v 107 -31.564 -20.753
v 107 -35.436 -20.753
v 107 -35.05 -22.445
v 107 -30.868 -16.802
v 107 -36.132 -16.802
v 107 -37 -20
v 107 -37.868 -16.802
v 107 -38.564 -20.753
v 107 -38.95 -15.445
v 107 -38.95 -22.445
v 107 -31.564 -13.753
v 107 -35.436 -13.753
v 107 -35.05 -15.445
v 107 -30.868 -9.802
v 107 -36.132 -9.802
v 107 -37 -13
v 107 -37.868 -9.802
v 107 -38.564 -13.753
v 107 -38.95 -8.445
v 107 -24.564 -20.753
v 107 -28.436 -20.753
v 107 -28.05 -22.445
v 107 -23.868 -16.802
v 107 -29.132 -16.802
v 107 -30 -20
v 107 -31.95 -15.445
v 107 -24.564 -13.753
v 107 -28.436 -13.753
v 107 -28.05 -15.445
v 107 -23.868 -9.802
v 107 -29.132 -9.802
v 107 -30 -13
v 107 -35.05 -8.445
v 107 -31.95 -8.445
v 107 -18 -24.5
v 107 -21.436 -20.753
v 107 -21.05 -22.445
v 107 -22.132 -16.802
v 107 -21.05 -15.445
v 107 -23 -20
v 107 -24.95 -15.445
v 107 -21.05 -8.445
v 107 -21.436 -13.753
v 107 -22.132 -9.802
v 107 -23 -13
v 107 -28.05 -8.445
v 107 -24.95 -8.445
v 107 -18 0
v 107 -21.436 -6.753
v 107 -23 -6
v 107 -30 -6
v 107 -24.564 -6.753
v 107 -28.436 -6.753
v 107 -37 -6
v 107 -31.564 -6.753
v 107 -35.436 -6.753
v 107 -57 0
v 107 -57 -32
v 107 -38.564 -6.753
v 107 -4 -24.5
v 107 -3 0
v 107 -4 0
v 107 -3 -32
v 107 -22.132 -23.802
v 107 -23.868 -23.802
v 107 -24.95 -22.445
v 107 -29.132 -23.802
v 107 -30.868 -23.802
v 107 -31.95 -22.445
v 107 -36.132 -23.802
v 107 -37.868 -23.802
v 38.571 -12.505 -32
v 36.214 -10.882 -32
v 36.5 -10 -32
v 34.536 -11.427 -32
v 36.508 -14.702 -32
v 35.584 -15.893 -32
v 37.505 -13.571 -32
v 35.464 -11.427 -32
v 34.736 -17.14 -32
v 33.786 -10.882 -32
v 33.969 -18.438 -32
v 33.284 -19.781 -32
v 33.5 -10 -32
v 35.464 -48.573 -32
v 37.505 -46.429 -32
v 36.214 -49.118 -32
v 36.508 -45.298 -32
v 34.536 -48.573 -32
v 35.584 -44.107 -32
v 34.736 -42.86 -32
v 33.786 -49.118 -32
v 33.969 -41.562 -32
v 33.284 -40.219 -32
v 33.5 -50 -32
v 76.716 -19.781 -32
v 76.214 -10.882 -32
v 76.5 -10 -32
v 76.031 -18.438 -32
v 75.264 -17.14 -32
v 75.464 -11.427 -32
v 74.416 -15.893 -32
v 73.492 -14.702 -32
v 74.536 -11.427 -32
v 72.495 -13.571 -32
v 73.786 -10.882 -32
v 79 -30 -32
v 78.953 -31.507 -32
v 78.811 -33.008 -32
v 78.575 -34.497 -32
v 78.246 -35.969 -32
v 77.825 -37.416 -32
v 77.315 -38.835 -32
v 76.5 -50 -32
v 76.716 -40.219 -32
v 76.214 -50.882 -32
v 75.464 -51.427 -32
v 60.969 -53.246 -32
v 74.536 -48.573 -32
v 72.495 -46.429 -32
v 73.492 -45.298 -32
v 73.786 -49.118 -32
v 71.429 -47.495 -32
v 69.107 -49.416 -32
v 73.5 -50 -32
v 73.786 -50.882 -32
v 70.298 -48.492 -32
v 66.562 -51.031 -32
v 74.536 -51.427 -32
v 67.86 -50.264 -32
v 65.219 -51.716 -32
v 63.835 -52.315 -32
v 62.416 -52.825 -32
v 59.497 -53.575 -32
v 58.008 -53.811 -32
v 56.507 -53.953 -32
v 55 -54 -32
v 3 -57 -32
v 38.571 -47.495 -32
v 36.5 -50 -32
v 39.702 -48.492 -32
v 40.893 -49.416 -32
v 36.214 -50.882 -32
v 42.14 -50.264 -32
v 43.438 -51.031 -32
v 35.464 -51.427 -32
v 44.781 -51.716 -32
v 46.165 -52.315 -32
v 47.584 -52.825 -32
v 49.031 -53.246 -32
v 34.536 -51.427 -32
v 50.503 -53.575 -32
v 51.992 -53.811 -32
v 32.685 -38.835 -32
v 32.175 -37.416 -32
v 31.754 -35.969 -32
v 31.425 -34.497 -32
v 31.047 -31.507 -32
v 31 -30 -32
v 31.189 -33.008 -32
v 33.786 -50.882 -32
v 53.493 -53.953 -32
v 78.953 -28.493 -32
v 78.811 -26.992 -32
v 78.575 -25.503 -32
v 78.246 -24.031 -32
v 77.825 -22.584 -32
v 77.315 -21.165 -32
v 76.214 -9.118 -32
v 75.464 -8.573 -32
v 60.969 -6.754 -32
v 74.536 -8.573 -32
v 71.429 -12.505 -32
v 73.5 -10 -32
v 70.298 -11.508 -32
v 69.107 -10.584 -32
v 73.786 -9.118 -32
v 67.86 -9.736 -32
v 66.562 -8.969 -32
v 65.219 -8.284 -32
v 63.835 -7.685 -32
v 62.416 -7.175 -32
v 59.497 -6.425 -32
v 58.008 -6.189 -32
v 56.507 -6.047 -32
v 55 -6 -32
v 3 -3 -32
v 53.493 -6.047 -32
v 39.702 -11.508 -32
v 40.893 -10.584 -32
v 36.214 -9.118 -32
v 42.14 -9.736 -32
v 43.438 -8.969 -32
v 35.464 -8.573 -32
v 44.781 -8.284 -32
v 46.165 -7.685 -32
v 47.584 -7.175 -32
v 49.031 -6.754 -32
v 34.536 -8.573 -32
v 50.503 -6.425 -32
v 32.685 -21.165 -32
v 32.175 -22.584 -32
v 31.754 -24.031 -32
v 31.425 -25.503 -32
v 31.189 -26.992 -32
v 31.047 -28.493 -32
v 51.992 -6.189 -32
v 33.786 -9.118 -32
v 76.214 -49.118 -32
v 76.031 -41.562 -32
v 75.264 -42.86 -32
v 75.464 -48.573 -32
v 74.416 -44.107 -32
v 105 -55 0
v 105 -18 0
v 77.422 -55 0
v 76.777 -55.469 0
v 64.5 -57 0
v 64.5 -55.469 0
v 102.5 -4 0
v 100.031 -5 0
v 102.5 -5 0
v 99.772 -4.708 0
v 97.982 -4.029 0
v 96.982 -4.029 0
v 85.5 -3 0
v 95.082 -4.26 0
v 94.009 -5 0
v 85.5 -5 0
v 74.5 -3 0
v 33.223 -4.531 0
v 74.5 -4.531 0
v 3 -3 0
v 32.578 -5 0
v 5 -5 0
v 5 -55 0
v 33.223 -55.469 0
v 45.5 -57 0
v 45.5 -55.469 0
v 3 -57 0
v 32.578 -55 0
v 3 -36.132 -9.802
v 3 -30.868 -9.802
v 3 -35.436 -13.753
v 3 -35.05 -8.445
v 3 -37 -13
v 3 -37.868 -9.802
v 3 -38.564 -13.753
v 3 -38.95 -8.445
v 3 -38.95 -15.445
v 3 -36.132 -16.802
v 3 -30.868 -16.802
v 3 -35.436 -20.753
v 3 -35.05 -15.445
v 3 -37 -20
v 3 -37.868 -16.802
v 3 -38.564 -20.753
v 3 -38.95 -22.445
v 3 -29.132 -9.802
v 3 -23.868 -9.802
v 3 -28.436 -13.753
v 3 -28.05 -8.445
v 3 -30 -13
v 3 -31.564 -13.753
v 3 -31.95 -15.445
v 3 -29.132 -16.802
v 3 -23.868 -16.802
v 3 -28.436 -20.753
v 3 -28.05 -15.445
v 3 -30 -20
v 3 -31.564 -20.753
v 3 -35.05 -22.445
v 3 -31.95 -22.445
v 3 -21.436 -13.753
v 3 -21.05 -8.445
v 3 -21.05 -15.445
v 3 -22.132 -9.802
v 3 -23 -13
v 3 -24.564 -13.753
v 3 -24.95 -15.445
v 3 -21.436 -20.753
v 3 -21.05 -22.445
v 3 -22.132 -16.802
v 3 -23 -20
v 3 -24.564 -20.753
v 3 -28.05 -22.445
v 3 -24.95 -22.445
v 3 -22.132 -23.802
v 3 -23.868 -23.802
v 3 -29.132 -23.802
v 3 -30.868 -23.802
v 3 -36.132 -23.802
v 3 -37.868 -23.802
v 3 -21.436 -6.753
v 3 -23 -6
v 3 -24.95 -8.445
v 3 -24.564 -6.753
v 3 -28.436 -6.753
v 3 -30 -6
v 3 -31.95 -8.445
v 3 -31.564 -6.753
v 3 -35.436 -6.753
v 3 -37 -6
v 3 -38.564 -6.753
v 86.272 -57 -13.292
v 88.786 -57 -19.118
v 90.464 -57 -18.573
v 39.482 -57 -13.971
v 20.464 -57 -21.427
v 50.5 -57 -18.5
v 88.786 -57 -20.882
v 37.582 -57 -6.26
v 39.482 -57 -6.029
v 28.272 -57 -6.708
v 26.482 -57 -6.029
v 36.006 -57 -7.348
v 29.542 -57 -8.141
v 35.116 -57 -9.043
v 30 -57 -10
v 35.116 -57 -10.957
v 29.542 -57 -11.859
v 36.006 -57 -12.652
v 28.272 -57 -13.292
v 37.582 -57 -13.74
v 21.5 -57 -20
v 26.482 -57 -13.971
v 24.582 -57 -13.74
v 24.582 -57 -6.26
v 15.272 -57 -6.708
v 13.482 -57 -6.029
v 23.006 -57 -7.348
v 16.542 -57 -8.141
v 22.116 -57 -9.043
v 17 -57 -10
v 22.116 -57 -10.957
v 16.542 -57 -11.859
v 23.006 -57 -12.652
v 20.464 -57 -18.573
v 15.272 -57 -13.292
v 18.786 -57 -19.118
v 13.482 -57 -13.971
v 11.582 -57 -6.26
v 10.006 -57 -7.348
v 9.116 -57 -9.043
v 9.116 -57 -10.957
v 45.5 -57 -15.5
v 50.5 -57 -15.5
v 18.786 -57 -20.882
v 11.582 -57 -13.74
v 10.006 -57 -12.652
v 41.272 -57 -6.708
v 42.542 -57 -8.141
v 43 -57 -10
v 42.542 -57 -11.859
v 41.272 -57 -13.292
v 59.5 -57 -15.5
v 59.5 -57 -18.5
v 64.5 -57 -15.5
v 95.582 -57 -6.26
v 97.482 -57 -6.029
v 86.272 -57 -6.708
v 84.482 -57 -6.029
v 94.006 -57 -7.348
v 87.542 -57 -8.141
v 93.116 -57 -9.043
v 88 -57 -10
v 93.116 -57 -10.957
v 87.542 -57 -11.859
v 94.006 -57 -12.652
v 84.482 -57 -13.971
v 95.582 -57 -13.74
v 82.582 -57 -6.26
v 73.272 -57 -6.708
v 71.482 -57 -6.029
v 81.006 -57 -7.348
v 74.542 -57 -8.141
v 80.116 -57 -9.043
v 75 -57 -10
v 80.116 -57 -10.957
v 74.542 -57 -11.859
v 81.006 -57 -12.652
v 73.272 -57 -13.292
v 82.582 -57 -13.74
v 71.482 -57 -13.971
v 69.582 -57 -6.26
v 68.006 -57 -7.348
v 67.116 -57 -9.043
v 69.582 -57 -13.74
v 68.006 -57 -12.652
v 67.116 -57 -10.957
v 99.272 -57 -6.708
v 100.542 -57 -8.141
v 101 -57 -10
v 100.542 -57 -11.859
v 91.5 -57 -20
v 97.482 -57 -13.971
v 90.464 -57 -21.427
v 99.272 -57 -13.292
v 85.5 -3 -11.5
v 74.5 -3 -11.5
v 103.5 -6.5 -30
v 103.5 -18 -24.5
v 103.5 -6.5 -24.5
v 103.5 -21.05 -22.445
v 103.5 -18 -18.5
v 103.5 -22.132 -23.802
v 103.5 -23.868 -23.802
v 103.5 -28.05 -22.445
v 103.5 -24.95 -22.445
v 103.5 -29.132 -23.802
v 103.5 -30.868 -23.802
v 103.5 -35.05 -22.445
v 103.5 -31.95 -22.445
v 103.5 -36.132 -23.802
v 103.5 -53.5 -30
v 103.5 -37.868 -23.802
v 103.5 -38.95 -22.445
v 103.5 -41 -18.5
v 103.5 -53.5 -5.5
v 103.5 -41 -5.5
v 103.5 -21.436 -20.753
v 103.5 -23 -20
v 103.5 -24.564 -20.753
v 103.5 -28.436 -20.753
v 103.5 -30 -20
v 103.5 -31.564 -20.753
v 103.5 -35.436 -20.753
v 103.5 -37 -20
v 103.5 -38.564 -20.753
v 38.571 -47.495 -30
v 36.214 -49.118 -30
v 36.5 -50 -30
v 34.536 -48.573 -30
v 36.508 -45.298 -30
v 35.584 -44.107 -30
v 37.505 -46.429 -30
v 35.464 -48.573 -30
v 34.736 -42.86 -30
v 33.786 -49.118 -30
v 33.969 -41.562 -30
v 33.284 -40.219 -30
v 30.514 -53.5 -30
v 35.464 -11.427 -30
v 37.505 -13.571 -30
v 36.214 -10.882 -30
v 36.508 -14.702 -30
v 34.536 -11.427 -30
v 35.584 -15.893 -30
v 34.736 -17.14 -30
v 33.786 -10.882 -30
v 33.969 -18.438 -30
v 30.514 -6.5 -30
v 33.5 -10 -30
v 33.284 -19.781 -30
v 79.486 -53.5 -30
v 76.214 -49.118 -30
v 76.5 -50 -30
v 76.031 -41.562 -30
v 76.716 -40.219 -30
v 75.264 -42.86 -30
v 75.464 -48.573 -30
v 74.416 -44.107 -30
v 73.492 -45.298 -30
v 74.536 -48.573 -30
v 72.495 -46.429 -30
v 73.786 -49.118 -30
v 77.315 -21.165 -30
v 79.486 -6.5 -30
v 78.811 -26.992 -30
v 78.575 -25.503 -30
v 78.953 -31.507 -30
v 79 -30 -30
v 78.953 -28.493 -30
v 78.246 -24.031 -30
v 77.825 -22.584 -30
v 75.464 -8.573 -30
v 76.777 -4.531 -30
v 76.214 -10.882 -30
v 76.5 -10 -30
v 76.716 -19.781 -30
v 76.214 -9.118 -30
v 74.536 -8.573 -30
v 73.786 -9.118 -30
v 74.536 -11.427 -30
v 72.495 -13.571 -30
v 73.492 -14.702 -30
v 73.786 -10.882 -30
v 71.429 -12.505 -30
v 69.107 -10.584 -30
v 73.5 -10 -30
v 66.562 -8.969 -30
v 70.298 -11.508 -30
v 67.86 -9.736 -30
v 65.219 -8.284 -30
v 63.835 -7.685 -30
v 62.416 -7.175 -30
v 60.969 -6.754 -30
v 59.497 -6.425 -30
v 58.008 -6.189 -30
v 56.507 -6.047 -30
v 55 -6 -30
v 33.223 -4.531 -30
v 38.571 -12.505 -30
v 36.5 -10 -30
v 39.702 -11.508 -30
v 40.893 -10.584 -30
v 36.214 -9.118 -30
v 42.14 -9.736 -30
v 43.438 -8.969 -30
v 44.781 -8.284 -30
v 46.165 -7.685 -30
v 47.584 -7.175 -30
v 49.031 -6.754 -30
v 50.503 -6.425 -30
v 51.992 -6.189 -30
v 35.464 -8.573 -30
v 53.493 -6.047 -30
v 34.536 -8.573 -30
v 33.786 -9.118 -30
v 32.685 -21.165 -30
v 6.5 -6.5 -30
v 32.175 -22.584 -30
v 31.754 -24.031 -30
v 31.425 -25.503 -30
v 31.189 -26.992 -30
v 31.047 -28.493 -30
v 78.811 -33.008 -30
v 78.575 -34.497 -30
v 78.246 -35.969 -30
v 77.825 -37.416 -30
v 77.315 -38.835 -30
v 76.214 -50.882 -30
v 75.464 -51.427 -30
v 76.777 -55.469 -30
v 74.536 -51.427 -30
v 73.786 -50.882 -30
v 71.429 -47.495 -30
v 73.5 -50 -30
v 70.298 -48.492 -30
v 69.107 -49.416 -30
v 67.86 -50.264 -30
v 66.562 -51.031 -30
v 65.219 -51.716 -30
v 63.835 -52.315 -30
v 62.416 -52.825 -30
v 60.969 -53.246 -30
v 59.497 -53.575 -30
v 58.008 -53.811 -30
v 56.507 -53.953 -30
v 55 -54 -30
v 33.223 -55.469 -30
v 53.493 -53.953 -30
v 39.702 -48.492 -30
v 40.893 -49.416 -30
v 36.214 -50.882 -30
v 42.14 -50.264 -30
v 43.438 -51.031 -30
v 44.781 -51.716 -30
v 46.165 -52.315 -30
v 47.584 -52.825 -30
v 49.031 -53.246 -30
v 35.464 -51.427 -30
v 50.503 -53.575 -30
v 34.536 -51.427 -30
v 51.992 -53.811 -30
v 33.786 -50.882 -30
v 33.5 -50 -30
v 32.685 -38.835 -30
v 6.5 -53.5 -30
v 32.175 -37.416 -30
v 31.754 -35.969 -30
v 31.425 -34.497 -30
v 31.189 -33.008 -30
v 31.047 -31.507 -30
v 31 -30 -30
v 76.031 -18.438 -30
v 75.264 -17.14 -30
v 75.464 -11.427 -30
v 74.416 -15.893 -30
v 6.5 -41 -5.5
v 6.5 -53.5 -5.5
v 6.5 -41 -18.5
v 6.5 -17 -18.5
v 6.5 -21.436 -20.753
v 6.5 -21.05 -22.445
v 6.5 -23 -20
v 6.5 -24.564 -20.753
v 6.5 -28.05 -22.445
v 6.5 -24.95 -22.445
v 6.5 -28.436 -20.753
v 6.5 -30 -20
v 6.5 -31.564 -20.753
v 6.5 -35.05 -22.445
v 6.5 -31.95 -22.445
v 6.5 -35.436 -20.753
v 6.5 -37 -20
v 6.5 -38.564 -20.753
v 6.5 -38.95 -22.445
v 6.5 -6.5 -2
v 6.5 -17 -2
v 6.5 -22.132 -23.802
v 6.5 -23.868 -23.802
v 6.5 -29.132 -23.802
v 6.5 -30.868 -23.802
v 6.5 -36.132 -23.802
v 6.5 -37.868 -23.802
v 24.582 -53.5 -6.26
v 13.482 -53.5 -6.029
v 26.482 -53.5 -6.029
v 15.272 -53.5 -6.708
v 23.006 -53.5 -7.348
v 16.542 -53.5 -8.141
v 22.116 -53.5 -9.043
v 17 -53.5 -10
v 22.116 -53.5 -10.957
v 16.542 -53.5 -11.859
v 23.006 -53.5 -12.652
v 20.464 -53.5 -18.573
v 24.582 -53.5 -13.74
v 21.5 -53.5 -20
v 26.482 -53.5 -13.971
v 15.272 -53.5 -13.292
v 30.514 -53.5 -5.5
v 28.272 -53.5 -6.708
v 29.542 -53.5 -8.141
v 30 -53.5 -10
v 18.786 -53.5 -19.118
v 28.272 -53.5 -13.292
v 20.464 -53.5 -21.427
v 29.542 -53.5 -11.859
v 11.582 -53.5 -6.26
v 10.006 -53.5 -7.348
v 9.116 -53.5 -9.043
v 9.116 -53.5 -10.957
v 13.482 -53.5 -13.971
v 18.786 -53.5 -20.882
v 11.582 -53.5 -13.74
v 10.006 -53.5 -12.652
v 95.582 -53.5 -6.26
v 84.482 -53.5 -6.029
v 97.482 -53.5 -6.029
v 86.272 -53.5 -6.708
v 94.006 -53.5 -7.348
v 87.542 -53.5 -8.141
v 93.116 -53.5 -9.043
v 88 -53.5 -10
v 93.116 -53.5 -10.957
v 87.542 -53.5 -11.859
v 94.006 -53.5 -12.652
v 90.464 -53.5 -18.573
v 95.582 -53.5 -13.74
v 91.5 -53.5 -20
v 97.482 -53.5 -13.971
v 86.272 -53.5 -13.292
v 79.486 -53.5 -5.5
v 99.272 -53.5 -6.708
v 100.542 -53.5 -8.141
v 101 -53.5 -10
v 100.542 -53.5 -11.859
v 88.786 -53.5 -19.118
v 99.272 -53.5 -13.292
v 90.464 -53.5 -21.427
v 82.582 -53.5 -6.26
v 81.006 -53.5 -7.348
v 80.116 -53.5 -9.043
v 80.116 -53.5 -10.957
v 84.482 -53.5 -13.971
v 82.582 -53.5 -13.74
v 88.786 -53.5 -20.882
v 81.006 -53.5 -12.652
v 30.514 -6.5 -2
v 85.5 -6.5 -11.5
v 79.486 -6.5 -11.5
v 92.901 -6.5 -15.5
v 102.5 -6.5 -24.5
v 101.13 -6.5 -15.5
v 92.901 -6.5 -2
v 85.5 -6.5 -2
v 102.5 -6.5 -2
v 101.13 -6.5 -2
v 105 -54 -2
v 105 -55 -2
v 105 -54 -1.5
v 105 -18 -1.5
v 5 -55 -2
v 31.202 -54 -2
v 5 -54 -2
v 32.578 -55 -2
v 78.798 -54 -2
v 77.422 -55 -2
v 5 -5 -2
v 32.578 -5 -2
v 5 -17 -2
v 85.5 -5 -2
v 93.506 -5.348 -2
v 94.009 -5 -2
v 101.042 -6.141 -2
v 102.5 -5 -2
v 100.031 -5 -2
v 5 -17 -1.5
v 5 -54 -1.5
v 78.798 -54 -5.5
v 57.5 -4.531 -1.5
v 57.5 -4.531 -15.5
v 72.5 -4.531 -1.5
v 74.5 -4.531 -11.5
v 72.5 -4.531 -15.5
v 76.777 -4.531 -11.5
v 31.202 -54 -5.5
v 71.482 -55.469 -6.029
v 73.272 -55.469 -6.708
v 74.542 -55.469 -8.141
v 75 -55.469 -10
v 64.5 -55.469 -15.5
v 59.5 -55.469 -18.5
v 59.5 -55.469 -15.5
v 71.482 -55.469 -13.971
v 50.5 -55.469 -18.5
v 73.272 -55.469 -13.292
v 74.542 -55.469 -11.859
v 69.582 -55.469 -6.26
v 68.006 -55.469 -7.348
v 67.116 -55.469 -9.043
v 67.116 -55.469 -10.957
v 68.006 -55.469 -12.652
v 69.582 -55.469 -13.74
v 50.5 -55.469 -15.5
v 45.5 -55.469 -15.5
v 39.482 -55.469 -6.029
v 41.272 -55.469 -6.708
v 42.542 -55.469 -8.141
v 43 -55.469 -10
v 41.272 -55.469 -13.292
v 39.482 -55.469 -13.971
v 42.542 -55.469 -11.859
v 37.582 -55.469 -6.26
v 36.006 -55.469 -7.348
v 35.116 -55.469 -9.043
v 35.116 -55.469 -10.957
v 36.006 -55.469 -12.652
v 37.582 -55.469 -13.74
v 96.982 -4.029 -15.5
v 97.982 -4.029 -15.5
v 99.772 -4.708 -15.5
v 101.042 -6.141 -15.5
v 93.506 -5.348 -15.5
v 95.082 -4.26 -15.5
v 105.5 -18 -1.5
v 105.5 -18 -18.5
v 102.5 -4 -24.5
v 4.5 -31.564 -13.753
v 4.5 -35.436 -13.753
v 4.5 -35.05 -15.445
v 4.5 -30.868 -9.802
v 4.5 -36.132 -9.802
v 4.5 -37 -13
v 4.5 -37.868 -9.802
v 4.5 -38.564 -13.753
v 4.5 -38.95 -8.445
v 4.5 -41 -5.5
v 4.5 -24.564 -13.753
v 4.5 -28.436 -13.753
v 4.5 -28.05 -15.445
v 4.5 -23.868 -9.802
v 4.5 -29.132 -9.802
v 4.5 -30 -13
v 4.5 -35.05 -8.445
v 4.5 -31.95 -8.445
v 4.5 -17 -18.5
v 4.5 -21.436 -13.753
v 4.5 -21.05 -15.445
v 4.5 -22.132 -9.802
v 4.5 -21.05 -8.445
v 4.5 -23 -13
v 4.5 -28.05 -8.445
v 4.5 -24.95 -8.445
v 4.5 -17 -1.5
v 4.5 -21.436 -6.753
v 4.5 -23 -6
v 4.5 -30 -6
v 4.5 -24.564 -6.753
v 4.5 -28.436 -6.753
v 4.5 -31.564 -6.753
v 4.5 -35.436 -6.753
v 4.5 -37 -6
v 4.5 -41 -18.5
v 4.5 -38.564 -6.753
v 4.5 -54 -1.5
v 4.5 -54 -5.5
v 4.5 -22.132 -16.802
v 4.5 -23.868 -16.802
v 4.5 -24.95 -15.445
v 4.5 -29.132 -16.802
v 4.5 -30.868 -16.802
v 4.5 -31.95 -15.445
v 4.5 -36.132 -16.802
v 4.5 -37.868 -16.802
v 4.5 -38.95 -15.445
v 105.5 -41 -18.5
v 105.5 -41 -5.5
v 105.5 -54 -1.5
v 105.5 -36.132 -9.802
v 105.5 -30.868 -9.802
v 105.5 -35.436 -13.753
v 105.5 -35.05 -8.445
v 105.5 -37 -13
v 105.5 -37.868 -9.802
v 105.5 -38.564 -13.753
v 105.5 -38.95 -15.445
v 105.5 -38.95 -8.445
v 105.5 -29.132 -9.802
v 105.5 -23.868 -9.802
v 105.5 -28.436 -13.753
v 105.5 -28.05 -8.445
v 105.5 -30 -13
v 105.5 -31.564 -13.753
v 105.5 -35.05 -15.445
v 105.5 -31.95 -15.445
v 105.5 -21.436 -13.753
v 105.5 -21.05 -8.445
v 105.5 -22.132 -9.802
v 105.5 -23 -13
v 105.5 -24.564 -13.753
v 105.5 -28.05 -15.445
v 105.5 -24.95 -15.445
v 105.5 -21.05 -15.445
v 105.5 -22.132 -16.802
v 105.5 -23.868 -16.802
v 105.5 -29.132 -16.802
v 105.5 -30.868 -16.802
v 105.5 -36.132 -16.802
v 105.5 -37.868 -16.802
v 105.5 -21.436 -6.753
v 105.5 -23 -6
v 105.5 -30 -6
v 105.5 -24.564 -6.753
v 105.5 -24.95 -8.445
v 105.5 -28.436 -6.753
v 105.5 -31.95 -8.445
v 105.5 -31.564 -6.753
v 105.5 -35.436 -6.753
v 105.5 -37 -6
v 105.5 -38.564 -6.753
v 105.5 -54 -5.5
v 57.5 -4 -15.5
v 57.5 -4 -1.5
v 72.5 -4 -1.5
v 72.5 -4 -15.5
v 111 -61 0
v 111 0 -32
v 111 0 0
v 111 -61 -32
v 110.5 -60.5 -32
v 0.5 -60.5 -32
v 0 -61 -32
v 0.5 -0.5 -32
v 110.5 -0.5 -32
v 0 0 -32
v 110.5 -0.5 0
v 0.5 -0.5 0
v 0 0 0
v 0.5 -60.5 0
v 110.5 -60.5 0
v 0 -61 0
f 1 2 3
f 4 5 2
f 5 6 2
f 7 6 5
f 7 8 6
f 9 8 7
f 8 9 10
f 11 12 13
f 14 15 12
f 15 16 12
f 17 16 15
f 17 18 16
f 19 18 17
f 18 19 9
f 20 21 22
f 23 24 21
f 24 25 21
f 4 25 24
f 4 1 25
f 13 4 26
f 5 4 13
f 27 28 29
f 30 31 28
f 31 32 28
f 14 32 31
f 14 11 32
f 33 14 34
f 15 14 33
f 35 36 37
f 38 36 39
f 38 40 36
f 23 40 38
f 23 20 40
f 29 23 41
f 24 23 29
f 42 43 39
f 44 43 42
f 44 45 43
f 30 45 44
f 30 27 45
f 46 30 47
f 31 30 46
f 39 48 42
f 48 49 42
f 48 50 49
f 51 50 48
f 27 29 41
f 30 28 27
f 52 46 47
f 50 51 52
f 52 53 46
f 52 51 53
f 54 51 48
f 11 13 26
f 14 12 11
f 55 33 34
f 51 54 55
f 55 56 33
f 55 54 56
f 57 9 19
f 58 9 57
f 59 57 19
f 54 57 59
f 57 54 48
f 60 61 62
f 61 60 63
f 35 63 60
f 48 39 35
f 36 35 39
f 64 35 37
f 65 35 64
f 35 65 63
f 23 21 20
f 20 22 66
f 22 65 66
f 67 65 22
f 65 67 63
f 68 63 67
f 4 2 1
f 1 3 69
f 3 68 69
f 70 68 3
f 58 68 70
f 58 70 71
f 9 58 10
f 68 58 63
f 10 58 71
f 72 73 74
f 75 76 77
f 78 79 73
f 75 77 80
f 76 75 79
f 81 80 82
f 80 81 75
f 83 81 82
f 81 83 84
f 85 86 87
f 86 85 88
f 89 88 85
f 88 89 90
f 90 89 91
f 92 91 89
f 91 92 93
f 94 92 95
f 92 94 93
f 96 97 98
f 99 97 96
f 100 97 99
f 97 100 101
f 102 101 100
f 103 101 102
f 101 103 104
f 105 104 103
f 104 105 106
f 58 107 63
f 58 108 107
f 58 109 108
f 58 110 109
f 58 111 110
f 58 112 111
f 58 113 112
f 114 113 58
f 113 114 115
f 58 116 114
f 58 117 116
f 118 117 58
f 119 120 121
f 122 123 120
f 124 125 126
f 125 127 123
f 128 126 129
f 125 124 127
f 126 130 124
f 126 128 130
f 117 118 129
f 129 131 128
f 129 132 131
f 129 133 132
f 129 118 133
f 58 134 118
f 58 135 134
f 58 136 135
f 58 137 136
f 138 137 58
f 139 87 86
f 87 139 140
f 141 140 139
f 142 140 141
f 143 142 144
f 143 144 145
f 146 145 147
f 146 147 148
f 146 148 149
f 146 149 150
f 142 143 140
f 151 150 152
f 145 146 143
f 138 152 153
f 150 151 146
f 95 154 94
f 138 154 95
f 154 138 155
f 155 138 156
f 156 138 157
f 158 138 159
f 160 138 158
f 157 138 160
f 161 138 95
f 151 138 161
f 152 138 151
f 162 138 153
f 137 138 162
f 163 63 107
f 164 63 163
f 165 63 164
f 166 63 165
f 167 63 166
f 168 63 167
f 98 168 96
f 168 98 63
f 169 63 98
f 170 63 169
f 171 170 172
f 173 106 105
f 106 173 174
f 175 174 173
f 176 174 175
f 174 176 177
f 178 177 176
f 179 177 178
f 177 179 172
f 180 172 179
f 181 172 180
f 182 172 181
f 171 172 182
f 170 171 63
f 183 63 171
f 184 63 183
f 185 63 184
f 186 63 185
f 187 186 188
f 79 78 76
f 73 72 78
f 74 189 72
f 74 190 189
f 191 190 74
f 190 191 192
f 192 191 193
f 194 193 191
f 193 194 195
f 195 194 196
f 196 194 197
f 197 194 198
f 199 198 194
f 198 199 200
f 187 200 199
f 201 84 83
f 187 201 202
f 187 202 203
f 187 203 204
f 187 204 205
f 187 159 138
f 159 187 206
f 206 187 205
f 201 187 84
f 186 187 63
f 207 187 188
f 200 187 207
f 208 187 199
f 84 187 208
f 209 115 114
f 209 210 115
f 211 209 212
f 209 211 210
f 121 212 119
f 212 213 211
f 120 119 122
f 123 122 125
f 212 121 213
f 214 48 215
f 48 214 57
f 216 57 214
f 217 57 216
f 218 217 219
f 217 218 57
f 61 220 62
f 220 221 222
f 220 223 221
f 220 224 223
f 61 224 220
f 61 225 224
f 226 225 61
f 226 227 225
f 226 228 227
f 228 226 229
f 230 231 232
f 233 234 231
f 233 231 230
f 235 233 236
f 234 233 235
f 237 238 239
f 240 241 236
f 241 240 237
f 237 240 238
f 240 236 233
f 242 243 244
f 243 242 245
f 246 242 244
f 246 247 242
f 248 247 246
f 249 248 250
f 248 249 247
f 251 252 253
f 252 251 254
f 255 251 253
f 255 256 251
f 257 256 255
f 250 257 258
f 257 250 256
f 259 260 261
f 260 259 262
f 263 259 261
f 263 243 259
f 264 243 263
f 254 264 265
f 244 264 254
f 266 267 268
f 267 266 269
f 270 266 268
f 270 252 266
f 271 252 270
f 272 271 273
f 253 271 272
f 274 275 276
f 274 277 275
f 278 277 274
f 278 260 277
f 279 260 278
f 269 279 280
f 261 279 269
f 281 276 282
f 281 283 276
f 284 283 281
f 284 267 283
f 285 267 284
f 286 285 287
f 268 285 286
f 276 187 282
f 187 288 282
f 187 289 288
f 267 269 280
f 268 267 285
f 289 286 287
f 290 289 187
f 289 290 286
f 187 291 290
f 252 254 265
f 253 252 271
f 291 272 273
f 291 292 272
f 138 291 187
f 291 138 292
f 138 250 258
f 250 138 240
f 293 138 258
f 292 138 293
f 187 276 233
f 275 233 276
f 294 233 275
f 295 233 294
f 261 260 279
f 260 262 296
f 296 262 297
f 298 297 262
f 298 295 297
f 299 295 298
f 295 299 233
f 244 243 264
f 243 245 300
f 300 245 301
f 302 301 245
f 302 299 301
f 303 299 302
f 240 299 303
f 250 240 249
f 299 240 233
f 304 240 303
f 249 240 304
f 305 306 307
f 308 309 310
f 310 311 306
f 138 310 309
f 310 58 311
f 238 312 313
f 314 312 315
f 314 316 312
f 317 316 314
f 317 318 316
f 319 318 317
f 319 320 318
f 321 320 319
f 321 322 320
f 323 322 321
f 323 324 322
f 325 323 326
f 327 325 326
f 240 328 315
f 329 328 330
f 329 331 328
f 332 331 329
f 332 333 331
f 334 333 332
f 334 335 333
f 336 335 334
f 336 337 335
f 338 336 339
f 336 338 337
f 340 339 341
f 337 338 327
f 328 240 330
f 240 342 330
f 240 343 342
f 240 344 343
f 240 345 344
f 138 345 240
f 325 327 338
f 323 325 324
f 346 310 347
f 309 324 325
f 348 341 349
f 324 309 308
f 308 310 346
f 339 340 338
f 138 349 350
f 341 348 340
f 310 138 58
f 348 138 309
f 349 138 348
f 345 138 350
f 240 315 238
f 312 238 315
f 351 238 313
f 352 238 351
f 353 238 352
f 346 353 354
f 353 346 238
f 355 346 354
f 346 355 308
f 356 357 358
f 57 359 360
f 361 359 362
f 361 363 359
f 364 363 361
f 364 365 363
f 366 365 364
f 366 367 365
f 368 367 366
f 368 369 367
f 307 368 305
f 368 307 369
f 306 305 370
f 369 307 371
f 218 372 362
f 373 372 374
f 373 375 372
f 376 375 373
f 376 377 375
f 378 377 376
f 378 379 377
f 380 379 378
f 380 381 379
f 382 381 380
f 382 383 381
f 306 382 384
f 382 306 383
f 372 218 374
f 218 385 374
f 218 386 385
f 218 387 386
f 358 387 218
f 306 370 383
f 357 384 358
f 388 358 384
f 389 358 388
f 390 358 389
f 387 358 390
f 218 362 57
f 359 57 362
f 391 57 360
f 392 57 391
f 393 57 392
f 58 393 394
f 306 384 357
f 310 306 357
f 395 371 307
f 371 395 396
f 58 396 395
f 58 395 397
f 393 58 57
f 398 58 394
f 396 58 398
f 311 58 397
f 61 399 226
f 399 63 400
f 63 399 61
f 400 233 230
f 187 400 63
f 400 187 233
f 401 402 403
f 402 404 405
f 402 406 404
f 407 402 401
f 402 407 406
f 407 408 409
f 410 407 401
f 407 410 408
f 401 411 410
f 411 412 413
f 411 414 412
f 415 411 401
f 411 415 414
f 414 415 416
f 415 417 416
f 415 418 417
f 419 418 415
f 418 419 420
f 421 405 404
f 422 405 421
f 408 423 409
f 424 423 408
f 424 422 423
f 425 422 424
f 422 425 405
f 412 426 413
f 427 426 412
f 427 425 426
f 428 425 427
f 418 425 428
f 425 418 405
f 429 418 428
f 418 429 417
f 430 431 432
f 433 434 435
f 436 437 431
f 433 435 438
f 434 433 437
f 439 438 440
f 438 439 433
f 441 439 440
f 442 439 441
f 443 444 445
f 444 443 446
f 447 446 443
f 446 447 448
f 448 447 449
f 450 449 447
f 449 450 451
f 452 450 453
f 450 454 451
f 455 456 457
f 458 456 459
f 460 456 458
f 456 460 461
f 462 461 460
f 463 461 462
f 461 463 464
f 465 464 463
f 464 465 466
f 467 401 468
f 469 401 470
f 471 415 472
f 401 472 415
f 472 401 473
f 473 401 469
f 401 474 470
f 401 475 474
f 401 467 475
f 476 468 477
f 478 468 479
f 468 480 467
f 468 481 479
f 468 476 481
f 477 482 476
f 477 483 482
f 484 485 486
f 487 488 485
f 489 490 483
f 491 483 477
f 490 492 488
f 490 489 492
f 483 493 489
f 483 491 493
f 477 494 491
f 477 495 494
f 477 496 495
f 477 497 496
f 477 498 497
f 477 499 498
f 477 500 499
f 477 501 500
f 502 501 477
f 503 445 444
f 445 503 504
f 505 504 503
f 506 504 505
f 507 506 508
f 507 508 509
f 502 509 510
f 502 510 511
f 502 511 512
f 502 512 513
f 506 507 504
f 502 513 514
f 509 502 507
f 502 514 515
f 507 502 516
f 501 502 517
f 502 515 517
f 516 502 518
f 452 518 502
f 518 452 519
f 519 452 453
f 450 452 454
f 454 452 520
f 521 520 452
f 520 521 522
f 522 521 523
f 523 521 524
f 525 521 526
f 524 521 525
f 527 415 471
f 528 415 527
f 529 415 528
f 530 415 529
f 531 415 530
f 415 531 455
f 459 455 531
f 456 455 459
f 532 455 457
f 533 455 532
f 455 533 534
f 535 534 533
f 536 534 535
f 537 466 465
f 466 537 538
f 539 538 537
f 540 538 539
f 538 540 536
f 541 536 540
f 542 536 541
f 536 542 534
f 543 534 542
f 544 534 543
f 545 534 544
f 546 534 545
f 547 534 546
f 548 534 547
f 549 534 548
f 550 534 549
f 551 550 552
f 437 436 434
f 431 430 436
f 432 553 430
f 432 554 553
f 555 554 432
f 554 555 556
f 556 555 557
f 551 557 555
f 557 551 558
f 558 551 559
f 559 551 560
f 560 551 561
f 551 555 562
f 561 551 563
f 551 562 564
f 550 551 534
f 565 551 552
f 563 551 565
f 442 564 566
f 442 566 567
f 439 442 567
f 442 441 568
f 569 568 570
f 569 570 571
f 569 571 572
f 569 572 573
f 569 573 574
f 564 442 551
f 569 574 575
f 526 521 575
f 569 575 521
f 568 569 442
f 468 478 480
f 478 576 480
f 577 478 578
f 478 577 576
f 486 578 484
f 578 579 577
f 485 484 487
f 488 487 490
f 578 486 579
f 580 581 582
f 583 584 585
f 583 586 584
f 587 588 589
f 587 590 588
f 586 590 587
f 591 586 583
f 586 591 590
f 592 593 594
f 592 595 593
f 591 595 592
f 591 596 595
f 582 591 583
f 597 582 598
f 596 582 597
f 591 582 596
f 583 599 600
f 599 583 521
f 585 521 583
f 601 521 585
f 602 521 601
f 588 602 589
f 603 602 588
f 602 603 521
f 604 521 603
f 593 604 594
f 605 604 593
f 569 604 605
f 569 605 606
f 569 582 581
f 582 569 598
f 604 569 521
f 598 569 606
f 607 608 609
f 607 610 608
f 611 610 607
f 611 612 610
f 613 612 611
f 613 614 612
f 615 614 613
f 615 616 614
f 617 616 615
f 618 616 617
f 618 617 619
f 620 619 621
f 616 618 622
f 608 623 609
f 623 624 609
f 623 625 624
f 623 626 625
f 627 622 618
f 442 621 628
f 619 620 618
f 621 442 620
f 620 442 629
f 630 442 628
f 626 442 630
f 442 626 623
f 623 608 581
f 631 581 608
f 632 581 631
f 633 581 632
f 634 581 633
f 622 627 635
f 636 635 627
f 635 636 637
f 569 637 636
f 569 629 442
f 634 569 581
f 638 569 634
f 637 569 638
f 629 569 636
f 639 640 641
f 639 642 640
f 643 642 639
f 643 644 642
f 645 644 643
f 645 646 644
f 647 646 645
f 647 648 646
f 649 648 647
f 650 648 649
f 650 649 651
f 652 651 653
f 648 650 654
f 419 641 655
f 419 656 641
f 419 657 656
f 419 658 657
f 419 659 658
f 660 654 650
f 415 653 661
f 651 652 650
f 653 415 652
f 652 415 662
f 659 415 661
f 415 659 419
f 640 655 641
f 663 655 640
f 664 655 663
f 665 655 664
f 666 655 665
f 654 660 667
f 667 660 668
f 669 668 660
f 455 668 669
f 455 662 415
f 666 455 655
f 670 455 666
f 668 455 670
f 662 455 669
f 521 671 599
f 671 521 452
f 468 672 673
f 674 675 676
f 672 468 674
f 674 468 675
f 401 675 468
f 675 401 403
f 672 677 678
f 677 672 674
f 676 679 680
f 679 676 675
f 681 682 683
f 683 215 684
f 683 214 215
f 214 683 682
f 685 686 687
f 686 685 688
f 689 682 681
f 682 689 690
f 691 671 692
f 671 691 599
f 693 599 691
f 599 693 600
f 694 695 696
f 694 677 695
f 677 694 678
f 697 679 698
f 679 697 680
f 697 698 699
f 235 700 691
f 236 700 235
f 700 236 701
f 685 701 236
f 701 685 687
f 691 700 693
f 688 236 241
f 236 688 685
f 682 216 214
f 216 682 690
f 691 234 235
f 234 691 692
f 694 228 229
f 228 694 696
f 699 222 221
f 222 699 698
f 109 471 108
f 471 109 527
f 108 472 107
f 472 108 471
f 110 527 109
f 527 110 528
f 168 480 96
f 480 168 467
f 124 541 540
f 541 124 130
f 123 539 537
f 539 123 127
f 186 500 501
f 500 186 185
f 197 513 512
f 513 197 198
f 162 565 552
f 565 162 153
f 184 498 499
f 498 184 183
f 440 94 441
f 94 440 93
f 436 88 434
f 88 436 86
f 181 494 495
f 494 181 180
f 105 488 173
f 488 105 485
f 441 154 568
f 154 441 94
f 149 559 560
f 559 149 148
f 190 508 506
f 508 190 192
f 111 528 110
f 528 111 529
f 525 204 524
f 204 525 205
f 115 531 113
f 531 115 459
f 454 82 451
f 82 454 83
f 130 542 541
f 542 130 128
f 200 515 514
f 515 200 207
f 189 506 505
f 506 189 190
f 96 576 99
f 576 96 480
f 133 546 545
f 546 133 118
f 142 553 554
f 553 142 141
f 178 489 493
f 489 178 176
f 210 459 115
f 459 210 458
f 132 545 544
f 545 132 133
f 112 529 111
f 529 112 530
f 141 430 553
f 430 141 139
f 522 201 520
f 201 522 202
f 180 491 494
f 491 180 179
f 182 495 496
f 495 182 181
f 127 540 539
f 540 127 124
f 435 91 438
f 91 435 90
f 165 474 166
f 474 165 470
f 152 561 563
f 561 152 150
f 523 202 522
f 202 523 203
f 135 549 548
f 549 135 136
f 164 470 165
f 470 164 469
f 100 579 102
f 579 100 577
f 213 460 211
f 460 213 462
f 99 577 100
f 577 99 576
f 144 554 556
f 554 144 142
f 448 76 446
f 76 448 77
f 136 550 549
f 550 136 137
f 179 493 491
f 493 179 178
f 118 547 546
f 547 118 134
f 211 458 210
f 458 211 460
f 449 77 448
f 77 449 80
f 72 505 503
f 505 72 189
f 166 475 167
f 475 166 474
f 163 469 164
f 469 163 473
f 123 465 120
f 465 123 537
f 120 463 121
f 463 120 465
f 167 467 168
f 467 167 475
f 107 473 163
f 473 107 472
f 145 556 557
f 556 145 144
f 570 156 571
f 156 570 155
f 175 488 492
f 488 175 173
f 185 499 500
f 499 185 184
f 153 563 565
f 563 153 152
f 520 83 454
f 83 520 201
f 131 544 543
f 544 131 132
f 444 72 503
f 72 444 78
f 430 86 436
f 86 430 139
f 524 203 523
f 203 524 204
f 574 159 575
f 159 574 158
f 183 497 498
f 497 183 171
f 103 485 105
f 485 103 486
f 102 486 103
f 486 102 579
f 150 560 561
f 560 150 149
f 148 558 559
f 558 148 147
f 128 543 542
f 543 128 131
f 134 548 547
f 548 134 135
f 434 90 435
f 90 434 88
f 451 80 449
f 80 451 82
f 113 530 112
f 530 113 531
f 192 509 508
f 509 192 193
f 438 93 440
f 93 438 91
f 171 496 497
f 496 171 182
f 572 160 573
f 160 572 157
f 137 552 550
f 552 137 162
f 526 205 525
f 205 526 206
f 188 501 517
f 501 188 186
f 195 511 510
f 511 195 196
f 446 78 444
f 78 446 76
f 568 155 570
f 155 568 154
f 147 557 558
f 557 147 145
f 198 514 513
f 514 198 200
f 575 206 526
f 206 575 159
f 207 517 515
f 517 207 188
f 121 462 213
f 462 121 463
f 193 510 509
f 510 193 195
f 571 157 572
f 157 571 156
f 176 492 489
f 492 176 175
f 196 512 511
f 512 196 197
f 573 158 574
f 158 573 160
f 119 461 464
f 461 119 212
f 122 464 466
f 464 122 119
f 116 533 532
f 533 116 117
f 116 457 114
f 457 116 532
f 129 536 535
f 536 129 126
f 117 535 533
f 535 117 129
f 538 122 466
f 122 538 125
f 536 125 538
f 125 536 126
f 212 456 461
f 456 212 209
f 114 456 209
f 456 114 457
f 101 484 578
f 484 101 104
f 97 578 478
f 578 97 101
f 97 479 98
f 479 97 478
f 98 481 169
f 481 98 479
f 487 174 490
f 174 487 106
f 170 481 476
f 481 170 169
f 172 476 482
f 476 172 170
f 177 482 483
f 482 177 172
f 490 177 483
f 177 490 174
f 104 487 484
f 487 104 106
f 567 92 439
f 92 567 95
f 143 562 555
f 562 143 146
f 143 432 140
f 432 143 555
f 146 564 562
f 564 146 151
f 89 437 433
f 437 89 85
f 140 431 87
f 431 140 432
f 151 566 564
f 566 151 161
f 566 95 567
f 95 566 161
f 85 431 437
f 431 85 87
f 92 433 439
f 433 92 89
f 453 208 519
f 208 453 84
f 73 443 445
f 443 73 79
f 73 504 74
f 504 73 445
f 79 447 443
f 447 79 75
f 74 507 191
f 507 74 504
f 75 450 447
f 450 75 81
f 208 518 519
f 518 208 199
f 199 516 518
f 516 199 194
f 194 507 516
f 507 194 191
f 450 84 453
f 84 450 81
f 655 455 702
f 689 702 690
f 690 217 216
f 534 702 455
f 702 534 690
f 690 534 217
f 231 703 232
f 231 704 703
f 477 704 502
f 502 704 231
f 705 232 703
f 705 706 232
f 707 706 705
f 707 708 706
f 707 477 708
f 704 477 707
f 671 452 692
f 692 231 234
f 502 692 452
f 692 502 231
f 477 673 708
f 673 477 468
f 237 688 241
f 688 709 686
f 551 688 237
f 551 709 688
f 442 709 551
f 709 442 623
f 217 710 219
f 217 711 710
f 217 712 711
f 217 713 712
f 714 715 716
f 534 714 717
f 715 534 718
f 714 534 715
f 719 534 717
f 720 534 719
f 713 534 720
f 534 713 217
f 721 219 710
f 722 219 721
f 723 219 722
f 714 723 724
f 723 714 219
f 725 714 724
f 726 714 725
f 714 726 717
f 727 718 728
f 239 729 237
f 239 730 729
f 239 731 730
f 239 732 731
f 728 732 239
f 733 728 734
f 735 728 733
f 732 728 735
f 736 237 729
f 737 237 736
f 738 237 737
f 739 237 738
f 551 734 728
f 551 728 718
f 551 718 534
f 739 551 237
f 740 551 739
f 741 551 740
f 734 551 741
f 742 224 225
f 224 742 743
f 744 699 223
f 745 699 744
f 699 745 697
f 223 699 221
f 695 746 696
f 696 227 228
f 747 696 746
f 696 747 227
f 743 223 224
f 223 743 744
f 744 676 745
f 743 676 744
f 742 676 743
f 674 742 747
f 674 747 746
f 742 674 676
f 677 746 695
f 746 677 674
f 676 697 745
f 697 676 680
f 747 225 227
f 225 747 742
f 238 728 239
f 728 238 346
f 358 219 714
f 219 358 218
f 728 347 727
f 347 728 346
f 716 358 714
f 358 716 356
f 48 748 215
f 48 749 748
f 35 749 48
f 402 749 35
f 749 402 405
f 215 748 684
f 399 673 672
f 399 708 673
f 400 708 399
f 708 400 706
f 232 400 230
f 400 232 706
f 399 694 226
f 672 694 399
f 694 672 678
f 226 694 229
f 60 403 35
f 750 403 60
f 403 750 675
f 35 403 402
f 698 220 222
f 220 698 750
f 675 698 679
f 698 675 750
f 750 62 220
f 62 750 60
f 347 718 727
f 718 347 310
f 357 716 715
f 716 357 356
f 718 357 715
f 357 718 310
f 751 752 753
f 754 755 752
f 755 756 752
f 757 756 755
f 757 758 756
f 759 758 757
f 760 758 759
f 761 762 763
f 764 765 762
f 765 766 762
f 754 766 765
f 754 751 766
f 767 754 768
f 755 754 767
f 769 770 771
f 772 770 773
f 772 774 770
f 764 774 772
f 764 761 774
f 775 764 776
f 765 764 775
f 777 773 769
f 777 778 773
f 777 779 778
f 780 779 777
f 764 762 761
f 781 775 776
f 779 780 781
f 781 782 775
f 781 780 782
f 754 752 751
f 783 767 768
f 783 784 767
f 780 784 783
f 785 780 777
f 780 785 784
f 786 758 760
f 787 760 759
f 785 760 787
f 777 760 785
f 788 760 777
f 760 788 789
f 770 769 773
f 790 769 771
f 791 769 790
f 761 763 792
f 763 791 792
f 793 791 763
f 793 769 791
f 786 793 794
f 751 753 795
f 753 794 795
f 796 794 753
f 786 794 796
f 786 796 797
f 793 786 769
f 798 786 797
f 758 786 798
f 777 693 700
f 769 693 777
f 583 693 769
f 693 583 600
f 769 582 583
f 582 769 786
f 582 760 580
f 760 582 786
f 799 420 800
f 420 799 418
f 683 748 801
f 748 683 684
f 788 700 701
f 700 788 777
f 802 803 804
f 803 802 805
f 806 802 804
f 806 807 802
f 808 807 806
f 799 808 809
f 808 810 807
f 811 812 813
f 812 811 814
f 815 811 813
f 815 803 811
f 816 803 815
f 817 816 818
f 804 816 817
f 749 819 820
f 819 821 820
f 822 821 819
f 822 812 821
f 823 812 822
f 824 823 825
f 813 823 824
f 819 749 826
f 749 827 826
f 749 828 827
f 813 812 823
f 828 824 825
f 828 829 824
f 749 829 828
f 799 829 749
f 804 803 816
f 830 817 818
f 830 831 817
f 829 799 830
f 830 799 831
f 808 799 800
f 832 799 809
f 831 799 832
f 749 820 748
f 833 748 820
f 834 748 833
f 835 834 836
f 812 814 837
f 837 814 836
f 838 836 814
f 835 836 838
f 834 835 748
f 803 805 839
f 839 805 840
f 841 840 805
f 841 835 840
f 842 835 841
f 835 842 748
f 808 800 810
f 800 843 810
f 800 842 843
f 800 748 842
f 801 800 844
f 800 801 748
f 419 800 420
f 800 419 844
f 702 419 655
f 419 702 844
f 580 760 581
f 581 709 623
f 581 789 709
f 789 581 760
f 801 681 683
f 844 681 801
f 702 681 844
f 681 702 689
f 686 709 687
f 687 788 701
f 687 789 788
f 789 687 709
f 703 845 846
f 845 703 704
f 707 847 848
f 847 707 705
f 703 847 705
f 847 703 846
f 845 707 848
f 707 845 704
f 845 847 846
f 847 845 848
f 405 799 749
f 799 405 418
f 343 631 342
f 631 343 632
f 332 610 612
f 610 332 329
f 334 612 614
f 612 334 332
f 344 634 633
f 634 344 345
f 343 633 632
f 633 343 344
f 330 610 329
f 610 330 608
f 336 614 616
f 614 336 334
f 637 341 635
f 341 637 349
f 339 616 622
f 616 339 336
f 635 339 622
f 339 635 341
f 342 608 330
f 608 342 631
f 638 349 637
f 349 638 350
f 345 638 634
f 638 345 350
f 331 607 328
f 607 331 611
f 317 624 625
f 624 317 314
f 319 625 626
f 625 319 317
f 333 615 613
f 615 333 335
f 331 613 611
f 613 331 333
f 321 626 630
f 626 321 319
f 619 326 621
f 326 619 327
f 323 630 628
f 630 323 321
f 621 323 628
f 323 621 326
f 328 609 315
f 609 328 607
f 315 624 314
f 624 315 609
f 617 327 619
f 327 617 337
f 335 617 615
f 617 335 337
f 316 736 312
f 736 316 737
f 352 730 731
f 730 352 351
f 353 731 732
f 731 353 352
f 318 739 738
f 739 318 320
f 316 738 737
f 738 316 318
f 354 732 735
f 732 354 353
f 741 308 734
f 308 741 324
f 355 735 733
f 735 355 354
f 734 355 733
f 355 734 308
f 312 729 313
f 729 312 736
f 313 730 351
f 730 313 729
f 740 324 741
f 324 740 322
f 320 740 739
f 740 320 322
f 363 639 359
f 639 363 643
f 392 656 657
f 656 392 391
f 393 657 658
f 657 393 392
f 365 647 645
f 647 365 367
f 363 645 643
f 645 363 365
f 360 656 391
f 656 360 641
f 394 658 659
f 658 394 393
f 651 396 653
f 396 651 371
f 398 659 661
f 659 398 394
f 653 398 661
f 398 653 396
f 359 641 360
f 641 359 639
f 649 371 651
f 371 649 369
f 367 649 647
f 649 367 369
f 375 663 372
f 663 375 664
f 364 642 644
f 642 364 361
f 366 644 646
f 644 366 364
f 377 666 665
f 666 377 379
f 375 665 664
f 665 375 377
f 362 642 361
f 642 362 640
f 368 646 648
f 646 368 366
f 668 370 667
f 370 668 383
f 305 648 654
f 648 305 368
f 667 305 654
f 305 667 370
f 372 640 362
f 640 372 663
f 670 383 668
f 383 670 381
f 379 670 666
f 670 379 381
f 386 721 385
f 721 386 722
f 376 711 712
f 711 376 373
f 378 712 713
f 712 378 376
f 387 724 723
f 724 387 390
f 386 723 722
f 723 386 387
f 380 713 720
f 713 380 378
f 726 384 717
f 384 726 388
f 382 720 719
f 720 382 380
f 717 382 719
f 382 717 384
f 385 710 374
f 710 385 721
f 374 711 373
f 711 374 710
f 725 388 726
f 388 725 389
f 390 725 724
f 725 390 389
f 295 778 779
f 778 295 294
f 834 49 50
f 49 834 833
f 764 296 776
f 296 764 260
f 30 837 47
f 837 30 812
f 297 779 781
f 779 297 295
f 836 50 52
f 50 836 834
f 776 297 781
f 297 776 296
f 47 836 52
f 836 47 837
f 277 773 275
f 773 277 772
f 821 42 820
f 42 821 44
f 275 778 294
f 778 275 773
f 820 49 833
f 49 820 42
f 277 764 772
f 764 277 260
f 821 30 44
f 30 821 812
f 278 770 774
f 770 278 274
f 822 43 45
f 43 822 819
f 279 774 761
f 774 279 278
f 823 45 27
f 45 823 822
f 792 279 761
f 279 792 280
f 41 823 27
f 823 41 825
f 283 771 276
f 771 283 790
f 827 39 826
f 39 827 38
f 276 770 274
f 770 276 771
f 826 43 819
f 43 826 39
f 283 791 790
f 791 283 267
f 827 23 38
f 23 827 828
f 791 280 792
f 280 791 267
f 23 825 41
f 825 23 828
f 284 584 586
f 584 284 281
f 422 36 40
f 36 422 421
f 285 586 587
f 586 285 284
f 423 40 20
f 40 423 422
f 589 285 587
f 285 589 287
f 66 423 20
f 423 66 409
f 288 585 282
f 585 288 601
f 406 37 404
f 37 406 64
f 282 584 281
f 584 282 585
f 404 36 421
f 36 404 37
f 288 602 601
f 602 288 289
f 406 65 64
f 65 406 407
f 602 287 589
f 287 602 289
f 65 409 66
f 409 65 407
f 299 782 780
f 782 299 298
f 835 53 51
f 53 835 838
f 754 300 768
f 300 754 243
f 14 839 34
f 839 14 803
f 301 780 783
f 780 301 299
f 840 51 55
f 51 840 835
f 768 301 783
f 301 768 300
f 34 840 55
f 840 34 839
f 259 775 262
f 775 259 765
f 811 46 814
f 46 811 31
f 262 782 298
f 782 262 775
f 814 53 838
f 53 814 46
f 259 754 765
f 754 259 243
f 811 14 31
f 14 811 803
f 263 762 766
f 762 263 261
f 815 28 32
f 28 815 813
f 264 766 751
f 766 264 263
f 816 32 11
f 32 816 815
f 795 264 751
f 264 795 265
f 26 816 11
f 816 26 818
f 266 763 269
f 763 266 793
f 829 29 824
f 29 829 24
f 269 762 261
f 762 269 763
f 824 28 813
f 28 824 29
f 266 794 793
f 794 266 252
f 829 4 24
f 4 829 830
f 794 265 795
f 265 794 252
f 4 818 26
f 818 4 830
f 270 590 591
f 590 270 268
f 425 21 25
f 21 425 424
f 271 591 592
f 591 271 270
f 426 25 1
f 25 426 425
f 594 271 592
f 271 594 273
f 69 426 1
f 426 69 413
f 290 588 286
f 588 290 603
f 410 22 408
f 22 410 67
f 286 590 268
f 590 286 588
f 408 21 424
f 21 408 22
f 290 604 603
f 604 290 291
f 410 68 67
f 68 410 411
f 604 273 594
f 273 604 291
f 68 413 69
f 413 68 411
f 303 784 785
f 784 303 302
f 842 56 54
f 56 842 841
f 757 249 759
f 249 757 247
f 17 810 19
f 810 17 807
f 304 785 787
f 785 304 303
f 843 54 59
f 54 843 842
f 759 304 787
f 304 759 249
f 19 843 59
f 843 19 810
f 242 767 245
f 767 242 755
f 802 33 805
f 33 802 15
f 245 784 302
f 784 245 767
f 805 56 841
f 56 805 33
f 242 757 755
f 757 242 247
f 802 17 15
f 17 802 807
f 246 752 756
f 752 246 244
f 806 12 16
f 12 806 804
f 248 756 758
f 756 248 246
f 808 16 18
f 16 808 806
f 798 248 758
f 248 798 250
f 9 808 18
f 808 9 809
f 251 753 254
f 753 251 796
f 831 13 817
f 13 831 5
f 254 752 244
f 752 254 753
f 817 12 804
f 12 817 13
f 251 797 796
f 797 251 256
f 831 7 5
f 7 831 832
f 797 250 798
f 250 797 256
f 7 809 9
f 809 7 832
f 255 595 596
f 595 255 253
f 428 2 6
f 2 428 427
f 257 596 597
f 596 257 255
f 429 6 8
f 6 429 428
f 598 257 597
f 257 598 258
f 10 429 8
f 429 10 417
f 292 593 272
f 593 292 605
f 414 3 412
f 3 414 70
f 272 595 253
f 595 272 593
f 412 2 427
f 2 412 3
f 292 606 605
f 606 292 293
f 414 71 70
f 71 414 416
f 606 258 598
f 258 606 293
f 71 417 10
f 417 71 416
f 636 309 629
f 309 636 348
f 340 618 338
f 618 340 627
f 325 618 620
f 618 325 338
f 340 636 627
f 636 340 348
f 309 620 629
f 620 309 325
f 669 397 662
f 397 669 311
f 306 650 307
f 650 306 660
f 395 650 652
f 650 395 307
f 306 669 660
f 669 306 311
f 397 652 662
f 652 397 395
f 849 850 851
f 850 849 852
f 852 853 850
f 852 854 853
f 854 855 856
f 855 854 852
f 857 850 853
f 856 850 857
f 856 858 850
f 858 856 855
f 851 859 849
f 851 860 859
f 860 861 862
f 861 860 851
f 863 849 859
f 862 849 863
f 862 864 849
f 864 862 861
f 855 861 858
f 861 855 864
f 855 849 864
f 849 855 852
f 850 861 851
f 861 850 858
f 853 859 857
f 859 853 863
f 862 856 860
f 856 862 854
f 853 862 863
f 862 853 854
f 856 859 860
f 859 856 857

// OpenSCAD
module fanHoles(t, d){
    $fn=100;

            cylinder(t, 24,24);
            translate([20, 20, 0])
                cylinder(t, d/2, d/2, $fn=10);
            translate([20, -20, 0])
                cylinder(t, d/2, d/2, $fn=10);
            translate([-20, 20, 0])
                cylinder(t, d/2, d/2, $fn=10);
            translate([-20, -20, 0])
                cylinder(t, d/2, d/2, $fn=10);
}

pcbX = 100;
pcbY = 50;
pcbZ = 2;
H = 30;
wall = 2;

module pcb(){
    color([0,0.5,0])
    cube([pcbX, pcbY, pcbZ]);
}

module pcbComponents(){
    //power connector
    translate([pcbX-20-10, -6, 0])
        color([1,0.5,0.0]) cube([10,13,8]);
    
    aw = 18;
    al = 40;
    at = 2;
    sw = 2;
    sh = 11;
    //arduino board
    translate([pcbX/2-aw/2, pcbY-al+2, sh])
        color([0,0,1]) cube([aw, al, at]);
    translate([pcbX/2-8/2, pcbY-10+2+1, sh+2])
        color([0.5,0.5,0.5]) cube([8, 10, 3]);
    
    //Arduino socket
    translate([pcbX/2-aw/2, pcbY-al+2, 0])
        color([0,0,0]) cube([2, al-2, sh]);
    translate([pcbX/2+aw/2-2, pcbY-al+2, 0])
        color([0,0,0]) cube([2, al-2, sh]);
    
    //Inductor volume
    translate([0,pcbY-12-2,0])
        cube([pcbX, 12, 3]);
        
   //Jumper volume
   translate([53,0,0])
   cube([14,8, 13]);
   
   //Coolers
   translate([0,13,0])
        color([0.5,0.5,0.5]) cube([41, 22, 16]);
   translate([pcbX-41,13,0])
        color([0.5,0.5,0.5]) cube([41, 22, 16]); 
}

module pcbComponentsExtraVolume(){
    //power connector
    translate([pcbX-20-10, -6, 0-pcbZ])
        color([1,0.5,0.0]) cube([10,13,8+pcbZ+1]);
    
    //Hole for 7805
    translate([pcbX-2, 0, -pcbZ])
        cube([10, 12, 22+pcbZ]);
    translate([pcbX-8, 4, -pcbZ])
        cylinder(15, 4, 4);
    
    aw = 18;
    al = 40;
    at = 2;
    sw = 2;
    sh = 11;
    //arduino board
    translate([pcbX/2-aw/2, pcbY-al+2+wall, -pcbZ])
        color([0,0,1]) cube([aw, al+wall, at+sh+pcbZ]);
    //translate([pcbX/2-8/2, pcbY-10+2+1, -pcbZ])
    //    color([0.5,0.5,0.5]) cube([8+pcbZ+1, 10, 3]);
    
    //Arduino socket
    //translate([pcbX/2-aw/2, pcbY-al+2, 0])
    //    color([0,0,0]) cube([2, al-2, sh]);
    //translate([pcbX/2+aw/2-2, pcbY-al+2, 0])
    //    color([0,0,0]) cube([2, al-2, sh]);
    
    //Inductor volume
    //translate([0,pcbY-12-2,0])
    //    cube([pcbX, 12, 3]);
    
}

module pcbWithComponents(){
    pcb();
    translate([0,0,2]){
        pcbComponents();
        pcbComponentsExtraVolume();
    }
}

module mainBoxShell(xi, yi, zi, ledgew, ledgeh, wall){
    color([0,0,0]);
    difference(){
        translate([-wall, -wall, 0])
            cube([xi+2*wall, yi+2*wall, zi+wall]);
        translate([ledgew,ledgew,-1])
            cube([xi-ledgew*2, yi-ledgew*2, zi+1]);
        translate([0,0,-1])
            cube([xi, yi, ledgeh+1]);
    }
}

module mainBoxWithFanHole(){
    difference(){
        mainBoxShell(pcbX, pcbY, H, 1.5,pcbZ, wall);
        translate([pcbX/2, pcbY/2, 0]){
            translate([0, 0, H-1])
                fanHoles(wall+2,3);
            $fn=100;
            hull(){
               
                fanHoles(H, 11.5);
            }
        }
    }
}


module boxWithComponentHoles(){
    difference(){
        mainBoxWithFanHole();
        minkowski(){
            translate([0,0,2]){
                pcbComponents();
                pcbComponentsExtraVolume();
            }
            translate([-0.5,-1,-0.5])
                cube([1,2,1]);
        }
        airHolesLong();
        airHolesShort();
        screwHoles();
    }
}

module airHolesLong(){
    for(i=[0:2]){
        translate([8+i*13, 40, 10])
            rotate([-90,0,0])
                cylinder(100,4,4);
    }
    for(i=[0:2]){
        translate([pcbX-(8+i*13), 40, 10])
            rotate([-90,0,0])
                cylinder(100,4,4);
    }
}

module screwHoles(){
        translate([15, 40, 20])
            rotate([-90,0,0])
                cylinder(100,3/2,3/2);
        translate([pcbX-15, 40, 20])
            rotate([-90,0,0])
                cylinder(100,3/2,3/2);
        translate([pcbX/2, 40, 5])
            rotate([-90,0,0])
                cylinder(100,3/2,3/2);

}

module airHolesShort(){
    sep = 7;
    for(y=[-1:1])
        for(z=[-1:1]){
            translate([-10,pcbY/2+y*sep,H/2+z*sep])
                rotate([0,90,0])
                    cylinder(pcbX+20, 2,2);
        }
}

module airGuide(){
    
}

//pcbWithComponents();
rotate([180,0,0]){
    translate([wall+3, wall+3, 0])
    boxWithComponentHoles();

    bx = pcbX+2*wall+6;
    by = pcbY+2*wall+6;
    bz = H+wall;

difference(){
    //translate([0, 0, 0]){
    cube([bx+1, by+1, bz]);
    translate([0.5, 0.5,0])
        cube([bx, by, bz]);
    //}
}}
//airHolesShort();
//airHoles();

//pcbWithComponents();
